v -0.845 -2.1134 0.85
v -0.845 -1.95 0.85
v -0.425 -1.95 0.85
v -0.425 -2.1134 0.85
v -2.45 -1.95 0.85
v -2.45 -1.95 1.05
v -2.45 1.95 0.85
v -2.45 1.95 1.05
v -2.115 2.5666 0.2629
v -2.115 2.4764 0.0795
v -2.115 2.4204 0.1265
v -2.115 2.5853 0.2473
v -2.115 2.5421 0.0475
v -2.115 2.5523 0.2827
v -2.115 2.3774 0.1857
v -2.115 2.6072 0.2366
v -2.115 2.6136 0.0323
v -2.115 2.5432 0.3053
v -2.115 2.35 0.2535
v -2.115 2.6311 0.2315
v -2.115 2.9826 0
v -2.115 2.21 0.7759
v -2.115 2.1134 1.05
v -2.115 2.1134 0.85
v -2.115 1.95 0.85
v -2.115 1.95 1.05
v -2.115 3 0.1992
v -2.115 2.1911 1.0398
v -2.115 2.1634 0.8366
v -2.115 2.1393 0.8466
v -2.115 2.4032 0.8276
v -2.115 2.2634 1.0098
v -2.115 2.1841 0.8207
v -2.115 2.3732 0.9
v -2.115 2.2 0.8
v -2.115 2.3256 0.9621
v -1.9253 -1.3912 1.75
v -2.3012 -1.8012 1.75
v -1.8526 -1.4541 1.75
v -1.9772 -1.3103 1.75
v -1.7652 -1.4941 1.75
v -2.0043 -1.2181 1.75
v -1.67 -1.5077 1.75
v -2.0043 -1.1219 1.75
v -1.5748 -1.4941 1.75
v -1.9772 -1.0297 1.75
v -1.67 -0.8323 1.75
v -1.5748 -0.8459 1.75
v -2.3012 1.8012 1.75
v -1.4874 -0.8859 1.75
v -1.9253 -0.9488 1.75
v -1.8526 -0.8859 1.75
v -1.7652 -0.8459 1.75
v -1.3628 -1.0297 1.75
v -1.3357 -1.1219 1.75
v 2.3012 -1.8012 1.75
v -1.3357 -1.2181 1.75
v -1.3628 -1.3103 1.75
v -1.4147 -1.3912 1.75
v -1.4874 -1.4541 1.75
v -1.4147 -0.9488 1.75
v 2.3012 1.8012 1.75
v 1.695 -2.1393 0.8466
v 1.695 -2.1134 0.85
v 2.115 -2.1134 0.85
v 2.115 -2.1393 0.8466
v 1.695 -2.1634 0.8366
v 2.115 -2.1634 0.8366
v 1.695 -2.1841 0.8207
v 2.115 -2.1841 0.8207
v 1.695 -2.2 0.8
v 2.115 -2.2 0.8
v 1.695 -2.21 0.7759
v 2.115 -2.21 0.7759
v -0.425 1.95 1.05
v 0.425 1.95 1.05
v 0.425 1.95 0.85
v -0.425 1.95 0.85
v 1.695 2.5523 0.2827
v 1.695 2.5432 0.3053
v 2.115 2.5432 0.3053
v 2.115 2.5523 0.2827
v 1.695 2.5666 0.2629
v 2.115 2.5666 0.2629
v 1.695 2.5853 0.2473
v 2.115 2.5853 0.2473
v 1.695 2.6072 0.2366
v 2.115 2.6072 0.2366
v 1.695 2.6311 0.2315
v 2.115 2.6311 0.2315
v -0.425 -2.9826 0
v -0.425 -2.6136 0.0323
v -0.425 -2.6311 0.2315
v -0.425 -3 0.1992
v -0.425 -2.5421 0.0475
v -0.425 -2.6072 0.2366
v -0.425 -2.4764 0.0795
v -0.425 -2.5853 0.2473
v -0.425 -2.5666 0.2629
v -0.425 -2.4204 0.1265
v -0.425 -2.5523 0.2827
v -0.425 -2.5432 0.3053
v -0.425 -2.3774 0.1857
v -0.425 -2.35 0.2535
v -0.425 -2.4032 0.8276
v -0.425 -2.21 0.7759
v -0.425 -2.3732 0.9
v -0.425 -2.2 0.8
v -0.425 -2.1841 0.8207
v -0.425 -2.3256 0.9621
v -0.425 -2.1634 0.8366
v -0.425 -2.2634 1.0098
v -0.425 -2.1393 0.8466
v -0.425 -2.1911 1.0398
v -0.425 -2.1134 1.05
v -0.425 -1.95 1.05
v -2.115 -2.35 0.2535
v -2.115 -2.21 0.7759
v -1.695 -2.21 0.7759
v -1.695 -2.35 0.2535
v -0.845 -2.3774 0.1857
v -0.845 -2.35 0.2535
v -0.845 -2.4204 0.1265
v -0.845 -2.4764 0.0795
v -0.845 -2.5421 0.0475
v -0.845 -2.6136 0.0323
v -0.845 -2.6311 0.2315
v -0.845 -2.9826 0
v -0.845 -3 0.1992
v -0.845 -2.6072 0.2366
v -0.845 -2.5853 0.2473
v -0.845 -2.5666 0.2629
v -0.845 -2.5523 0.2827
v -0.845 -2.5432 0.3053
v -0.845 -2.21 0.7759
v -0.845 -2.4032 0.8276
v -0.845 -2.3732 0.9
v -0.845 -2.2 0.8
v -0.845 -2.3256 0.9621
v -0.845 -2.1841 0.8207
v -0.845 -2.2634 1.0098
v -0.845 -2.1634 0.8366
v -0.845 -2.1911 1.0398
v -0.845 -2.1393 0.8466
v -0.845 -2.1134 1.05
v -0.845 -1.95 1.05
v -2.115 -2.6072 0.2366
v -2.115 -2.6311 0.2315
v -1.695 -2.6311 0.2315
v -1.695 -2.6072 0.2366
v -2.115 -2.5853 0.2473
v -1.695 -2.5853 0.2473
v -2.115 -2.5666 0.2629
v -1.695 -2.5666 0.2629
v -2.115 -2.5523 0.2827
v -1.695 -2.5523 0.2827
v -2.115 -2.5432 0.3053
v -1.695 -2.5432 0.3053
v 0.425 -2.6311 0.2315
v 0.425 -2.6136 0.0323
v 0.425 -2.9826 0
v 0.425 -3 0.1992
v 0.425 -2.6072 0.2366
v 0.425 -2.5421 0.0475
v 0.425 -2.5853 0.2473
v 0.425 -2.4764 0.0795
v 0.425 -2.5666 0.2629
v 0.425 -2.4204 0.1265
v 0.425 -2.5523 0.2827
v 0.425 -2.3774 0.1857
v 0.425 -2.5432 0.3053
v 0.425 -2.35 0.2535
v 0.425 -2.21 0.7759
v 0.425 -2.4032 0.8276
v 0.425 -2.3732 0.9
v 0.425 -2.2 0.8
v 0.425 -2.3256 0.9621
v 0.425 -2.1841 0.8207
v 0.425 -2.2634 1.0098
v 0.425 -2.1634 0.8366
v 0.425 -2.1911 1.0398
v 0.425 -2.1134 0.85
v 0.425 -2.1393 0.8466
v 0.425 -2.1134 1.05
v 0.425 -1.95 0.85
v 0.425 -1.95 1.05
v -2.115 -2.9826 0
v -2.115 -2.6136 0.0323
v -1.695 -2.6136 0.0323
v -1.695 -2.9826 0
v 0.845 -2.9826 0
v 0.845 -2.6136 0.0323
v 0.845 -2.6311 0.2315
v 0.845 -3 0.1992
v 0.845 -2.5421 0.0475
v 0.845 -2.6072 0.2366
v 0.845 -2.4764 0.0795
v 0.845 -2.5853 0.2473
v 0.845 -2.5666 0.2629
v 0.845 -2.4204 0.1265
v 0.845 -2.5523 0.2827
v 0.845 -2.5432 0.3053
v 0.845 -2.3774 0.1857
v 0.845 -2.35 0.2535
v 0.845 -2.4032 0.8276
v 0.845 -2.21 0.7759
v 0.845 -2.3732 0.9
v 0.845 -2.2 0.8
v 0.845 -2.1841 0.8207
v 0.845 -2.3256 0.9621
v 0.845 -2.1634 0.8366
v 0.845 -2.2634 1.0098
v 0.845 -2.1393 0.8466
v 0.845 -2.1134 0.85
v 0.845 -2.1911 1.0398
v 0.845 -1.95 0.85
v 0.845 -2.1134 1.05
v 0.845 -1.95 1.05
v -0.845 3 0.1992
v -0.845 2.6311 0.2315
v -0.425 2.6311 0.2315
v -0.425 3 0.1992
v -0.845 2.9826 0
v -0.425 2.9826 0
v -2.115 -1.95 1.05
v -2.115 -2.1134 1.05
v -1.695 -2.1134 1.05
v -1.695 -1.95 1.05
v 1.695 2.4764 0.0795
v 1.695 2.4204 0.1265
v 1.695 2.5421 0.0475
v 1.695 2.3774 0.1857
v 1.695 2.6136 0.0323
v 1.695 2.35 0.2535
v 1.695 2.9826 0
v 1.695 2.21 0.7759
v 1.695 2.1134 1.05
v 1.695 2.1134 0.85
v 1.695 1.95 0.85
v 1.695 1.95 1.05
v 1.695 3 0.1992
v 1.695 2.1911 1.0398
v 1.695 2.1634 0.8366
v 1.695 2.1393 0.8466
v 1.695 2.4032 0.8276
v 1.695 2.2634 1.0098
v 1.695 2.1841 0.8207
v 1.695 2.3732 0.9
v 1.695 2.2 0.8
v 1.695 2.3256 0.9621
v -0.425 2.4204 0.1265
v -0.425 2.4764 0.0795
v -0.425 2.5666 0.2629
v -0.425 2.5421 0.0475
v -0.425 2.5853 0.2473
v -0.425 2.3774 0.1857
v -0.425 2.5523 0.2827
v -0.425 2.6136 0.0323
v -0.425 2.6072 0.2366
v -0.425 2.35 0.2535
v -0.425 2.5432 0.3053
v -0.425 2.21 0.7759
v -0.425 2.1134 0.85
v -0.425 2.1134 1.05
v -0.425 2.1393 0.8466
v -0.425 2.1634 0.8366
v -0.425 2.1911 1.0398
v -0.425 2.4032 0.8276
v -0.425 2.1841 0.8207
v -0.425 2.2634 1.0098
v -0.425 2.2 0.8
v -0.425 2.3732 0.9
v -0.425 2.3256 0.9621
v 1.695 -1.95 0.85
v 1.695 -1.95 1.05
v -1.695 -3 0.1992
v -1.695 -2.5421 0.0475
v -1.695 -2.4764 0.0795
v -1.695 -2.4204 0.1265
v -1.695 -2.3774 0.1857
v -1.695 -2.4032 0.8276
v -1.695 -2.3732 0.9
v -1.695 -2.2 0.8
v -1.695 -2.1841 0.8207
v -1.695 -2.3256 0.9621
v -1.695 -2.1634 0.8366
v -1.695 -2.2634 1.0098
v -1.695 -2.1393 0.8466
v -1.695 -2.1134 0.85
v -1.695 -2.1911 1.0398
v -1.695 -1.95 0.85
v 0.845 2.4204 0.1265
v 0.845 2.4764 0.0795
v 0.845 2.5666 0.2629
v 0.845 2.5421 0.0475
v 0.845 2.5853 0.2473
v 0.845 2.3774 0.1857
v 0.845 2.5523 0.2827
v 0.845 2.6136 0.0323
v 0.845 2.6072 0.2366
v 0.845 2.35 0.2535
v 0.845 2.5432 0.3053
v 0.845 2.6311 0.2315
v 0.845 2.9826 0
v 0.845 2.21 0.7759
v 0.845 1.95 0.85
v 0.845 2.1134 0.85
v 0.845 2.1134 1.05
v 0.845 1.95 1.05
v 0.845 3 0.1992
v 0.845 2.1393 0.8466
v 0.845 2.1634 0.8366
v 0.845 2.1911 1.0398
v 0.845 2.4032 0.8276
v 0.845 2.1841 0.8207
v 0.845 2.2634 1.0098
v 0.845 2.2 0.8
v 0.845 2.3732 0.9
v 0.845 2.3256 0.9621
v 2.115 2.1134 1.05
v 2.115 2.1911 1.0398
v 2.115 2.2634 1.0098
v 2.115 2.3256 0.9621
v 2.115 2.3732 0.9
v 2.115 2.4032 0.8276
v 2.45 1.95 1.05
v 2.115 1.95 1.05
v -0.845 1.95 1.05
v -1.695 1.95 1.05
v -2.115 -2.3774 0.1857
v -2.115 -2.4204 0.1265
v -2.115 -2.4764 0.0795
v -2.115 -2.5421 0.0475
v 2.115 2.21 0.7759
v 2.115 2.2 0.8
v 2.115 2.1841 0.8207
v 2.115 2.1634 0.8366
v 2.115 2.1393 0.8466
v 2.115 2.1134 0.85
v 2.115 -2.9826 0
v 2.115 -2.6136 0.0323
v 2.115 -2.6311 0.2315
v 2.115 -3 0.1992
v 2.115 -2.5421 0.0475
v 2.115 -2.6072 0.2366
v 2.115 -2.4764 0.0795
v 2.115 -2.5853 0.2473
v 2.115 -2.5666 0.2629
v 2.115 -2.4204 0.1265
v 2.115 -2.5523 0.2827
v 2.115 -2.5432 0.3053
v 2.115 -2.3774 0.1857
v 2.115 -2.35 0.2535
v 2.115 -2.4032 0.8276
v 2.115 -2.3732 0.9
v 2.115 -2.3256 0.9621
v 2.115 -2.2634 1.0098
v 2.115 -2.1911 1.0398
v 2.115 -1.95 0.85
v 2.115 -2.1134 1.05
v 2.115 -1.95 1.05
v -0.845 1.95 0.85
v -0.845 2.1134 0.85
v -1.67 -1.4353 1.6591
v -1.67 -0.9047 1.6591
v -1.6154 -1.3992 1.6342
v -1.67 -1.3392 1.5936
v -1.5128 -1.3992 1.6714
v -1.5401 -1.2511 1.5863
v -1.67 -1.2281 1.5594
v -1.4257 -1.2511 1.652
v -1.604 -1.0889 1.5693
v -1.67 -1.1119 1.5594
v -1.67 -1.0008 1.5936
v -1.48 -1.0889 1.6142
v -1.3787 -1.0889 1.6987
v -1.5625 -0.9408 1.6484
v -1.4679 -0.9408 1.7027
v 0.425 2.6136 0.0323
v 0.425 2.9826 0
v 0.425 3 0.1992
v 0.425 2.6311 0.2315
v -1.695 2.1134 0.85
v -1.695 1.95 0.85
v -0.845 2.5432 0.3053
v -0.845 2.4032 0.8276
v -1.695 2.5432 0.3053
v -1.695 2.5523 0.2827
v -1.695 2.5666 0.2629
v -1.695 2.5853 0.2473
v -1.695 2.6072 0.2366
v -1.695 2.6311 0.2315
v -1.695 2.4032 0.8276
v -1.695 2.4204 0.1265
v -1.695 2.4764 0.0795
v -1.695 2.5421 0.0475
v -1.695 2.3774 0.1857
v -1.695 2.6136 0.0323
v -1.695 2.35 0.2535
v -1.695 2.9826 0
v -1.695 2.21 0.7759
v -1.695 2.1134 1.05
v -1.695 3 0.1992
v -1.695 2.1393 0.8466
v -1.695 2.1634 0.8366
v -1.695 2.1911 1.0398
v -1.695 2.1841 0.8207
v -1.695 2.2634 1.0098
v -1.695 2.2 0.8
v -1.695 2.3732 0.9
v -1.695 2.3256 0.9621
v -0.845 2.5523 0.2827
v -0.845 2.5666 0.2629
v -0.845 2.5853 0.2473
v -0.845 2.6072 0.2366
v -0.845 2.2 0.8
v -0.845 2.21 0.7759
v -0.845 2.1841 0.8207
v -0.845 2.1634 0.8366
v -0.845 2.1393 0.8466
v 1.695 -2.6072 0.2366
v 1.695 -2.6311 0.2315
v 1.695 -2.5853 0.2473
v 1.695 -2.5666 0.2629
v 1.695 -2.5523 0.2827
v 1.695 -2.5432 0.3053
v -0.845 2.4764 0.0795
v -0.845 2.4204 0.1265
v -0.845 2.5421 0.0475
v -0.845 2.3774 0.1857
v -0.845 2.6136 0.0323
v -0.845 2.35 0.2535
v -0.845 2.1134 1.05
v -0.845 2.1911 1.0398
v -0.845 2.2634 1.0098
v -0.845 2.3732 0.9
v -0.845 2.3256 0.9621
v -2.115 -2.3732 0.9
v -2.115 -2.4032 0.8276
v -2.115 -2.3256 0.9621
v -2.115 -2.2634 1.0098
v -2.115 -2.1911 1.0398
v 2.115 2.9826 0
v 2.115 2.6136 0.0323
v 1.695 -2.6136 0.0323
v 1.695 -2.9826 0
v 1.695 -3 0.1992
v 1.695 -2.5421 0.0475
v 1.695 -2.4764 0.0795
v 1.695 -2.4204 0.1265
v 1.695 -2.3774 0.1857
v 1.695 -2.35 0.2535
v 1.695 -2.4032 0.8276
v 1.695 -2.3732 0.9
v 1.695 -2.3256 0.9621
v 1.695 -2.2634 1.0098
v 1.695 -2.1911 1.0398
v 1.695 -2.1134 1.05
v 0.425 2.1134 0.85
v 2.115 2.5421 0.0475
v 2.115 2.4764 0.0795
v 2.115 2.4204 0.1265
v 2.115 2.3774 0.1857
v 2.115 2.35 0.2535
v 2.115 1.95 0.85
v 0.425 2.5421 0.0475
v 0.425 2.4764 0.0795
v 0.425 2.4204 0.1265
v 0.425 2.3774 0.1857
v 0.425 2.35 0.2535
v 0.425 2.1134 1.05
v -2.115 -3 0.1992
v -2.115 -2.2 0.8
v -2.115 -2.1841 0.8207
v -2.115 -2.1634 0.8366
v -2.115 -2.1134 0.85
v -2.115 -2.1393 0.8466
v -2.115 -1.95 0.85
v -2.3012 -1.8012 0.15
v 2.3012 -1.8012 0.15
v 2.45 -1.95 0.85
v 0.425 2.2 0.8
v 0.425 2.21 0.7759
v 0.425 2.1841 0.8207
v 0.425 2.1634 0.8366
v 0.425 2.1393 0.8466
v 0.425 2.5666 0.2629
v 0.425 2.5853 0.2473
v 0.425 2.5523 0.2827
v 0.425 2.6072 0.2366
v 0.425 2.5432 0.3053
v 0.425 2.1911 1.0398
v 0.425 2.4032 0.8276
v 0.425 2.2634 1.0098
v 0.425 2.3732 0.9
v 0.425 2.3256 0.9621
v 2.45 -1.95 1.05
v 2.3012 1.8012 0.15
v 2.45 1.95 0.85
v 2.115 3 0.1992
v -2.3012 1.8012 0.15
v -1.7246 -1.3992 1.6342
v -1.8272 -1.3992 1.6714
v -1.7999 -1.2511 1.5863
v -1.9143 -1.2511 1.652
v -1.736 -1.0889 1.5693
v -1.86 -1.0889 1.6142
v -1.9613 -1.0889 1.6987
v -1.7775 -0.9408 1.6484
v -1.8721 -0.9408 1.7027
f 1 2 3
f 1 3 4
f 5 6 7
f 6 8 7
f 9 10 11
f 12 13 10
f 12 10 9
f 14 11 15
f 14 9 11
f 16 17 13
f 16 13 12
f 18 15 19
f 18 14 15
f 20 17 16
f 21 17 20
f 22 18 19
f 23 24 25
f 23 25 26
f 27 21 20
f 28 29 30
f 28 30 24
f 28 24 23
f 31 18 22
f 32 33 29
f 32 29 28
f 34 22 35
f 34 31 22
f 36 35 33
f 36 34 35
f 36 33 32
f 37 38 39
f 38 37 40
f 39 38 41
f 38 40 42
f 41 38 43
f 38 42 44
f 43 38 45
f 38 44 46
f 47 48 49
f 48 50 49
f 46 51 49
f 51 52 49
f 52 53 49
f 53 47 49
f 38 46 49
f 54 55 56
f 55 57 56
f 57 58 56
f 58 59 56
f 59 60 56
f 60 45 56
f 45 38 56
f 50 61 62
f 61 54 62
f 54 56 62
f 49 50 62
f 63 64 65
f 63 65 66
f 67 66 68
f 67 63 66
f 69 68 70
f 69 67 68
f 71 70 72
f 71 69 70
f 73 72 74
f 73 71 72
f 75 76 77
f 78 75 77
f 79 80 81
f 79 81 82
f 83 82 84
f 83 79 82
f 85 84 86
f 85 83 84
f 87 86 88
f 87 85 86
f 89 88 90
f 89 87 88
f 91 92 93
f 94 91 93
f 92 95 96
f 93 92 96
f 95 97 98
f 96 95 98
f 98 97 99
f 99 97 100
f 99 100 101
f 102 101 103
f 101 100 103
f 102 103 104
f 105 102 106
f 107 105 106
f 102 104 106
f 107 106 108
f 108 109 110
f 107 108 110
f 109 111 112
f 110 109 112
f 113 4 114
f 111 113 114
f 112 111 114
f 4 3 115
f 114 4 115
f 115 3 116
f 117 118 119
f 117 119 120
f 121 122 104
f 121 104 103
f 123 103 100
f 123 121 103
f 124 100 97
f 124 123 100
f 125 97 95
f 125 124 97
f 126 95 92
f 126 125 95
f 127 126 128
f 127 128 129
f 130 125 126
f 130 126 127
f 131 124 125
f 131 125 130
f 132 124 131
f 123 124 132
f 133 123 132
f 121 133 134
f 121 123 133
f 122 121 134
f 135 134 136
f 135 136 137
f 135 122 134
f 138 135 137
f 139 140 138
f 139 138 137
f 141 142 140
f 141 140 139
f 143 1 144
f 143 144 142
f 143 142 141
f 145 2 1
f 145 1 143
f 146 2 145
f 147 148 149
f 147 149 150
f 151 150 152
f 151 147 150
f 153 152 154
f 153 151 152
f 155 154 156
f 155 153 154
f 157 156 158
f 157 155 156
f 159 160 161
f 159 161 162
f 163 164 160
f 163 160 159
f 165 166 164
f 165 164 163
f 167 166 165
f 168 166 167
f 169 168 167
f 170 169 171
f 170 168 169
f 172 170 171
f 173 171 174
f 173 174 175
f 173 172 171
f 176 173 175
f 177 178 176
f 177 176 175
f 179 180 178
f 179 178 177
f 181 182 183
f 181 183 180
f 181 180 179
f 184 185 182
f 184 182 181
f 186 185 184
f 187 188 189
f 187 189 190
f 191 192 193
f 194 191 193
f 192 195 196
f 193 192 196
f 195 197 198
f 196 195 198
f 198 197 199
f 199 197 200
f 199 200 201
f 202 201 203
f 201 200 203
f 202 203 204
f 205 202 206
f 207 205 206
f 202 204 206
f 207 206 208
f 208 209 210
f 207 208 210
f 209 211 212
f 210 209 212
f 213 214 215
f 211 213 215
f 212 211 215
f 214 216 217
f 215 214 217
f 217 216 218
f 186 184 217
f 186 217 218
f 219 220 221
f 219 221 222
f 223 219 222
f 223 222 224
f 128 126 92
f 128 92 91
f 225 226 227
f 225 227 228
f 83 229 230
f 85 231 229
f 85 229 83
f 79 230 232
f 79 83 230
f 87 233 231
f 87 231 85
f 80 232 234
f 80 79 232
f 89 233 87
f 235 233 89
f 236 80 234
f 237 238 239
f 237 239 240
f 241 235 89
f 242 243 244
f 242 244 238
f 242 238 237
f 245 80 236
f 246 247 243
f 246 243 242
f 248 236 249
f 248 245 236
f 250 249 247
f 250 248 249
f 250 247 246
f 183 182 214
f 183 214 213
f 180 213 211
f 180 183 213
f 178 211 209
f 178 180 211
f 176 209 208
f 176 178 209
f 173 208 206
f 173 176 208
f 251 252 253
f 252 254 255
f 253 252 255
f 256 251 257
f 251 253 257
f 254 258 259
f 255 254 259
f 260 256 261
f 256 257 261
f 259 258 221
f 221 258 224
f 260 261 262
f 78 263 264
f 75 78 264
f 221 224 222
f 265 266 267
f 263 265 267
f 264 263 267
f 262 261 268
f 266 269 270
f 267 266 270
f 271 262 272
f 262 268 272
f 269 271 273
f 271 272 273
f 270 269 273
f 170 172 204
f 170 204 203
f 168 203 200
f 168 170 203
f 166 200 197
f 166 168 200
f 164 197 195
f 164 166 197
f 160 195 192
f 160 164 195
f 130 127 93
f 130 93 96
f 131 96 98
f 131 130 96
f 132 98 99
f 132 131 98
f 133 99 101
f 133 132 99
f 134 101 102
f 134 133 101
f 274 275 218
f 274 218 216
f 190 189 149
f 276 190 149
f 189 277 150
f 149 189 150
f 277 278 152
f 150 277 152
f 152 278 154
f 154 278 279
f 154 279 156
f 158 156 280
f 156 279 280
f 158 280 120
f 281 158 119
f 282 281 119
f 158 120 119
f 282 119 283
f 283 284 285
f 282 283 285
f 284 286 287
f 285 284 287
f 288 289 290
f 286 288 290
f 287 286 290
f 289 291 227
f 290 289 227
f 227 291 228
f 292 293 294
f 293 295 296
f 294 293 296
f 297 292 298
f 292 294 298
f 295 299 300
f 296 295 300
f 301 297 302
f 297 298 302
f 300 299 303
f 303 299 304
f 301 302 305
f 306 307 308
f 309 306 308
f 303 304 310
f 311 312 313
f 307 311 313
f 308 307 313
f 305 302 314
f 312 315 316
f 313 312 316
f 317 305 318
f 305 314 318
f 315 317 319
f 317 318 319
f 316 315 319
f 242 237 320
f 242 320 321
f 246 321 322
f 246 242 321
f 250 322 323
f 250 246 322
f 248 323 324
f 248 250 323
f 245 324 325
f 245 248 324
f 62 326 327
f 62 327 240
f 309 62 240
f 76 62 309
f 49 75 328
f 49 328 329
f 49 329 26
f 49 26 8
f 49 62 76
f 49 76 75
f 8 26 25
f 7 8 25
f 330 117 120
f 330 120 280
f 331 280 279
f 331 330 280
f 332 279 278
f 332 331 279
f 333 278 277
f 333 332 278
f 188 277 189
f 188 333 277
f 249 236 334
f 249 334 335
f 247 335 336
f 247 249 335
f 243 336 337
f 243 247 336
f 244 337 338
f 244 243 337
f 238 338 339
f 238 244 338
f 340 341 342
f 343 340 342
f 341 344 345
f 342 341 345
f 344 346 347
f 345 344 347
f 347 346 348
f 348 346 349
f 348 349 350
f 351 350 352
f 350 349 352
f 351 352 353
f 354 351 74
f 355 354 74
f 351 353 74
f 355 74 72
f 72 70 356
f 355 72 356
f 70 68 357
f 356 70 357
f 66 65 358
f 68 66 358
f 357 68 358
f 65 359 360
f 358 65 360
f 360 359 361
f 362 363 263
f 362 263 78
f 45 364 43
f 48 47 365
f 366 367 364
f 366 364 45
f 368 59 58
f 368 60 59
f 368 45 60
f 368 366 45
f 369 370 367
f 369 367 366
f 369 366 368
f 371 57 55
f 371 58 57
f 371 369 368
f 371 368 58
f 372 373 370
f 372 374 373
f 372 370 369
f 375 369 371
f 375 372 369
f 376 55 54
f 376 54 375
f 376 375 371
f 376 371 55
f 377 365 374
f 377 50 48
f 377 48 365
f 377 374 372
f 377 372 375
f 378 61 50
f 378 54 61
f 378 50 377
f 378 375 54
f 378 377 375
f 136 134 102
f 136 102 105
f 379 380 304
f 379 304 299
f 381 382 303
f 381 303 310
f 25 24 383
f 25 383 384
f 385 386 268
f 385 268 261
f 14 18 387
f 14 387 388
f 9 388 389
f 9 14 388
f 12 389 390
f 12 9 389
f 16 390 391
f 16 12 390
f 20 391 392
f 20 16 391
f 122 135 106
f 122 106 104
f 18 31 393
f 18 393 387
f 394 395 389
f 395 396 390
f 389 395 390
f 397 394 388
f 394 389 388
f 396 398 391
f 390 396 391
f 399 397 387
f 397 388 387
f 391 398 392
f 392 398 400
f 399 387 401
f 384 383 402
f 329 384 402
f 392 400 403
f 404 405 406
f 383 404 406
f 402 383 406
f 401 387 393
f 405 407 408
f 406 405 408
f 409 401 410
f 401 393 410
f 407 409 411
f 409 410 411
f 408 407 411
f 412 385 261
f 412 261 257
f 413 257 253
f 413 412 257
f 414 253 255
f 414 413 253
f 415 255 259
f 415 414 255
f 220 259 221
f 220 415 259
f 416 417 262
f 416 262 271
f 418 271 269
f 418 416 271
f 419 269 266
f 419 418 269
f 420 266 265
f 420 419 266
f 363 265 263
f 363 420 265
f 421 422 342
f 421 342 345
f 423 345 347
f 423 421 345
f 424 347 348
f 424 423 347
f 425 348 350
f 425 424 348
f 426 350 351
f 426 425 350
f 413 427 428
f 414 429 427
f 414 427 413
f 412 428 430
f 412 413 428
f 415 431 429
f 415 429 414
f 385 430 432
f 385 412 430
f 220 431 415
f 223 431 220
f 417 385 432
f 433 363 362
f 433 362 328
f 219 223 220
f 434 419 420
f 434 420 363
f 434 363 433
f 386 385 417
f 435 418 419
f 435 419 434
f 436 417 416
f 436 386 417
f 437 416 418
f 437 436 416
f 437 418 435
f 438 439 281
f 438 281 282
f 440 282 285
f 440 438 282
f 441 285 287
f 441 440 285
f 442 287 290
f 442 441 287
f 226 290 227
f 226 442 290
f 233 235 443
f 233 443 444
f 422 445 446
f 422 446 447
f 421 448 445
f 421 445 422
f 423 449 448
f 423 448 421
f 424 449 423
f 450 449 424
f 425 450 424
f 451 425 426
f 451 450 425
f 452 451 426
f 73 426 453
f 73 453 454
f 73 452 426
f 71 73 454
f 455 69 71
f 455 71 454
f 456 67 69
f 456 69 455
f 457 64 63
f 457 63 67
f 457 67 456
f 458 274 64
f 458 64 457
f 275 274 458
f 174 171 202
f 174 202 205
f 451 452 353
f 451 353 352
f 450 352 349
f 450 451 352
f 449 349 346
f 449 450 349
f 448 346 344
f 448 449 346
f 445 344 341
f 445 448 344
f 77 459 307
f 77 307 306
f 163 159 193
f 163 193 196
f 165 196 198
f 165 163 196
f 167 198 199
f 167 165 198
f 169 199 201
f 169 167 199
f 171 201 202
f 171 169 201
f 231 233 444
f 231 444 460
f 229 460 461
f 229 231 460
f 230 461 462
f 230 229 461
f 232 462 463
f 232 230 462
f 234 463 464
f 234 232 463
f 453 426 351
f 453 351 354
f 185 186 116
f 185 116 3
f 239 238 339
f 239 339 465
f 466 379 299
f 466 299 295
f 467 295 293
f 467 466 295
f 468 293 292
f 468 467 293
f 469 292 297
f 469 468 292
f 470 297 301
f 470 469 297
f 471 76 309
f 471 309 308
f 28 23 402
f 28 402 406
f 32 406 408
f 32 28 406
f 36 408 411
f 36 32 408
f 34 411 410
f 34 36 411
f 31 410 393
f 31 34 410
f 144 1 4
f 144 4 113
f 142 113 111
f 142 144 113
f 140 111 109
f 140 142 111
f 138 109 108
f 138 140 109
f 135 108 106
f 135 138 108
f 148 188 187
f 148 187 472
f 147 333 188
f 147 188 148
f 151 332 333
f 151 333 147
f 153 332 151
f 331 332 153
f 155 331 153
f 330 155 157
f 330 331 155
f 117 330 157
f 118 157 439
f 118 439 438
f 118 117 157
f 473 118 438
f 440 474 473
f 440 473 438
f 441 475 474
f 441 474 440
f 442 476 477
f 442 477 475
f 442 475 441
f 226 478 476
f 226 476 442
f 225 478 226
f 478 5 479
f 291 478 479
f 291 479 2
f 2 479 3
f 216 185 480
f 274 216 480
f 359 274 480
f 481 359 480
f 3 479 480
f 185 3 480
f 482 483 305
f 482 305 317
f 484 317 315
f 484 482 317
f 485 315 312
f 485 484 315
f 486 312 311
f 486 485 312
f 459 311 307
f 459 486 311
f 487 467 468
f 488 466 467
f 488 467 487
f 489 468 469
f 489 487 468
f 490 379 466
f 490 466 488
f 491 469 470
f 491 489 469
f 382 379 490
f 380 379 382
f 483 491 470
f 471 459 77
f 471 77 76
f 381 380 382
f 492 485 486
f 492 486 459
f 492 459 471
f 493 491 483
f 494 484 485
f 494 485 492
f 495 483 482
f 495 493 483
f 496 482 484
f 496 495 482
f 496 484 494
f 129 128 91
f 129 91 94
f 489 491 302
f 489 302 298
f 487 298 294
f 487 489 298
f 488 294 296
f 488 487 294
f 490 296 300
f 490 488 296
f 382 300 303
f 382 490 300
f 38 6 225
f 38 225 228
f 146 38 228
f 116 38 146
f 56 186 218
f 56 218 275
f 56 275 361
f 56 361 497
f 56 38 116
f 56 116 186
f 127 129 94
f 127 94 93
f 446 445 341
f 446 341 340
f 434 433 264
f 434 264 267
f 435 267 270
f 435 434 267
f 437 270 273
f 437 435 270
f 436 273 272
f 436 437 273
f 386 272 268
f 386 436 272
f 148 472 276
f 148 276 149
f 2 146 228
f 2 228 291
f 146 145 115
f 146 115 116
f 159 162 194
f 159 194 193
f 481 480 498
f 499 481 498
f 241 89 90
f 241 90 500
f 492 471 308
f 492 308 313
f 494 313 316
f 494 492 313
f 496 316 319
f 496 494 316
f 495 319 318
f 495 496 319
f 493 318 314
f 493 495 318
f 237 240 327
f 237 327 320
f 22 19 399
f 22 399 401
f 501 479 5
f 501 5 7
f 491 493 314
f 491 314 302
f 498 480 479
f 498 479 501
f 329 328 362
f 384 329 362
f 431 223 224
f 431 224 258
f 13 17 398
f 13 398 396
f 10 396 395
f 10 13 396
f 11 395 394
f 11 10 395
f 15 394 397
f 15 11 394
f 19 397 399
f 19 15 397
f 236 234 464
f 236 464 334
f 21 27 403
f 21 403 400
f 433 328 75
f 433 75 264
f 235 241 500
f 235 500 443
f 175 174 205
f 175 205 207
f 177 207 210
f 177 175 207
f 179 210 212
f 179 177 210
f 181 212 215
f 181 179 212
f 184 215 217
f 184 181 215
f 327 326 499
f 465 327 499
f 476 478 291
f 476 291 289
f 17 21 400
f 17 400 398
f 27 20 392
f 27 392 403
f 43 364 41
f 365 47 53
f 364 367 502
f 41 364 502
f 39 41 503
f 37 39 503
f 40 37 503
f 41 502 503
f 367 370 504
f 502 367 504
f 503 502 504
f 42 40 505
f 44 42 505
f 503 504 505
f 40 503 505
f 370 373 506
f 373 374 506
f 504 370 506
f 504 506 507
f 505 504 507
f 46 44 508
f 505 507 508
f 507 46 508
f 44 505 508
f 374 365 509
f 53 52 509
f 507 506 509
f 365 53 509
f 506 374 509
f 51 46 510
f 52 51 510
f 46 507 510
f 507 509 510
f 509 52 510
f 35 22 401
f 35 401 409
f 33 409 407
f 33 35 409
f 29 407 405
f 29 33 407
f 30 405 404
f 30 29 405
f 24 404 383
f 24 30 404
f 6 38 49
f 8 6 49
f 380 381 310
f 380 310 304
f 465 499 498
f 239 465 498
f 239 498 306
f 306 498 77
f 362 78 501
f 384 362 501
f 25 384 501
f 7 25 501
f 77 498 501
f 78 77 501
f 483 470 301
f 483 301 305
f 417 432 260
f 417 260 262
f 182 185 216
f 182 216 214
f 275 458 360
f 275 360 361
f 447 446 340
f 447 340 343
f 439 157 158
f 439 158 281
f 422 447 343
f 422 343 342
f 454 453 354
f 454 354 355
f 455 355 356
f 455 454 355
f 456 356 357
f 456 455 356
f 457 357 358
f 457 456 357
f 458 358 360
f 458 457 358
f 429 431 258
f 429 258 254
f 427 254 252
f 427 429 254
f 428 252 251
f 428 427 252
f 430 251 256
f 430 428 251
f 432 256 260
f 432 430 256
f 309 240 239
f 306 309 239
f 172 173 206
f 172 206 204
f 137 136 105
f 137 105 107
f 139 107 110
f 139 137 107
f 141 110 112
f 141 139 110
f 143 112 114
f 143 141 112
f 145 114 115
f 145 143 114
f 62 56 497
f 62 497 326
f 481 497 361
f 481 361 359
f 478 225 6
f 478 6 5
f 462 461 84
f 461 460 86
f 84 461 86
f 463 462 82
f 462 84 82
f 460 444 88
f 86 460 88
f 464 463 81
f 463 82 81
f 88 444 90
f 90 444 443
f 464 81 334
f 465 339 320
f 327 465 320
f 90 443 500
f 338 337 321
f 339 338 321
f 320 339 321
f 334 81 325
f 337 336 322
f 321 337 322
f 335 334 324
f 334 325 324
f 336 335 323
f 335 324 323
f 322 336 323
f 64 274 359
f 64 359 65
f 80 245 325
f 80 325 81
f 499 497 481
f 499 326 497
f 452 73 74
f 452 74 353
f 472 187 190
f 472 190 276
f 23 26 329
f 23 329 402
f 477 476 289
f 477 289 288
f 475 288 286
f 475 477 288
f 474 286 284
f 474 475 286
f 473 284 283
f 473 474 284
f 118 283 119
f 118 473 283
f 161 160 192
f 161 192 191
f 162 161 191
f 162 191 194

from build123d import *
from OCP.BRepFilletAPI import BRepFilletAPI_MakeChamfer
from build123d.topology import SkipClean

# Parameters (mm, degrees)
BODYWXH_W          = 1.6
BODYWXH_H          = 3.9
BOSS_BODY_DEPTH    = 2.45
CHAMFER1_SIZE      = 0.7
CHAMFER1_SIZE2     = 0.148789593
PINS_DEPTH         = 0.42
PATTERNLEADS_COUNT = 4
PATTERNLEADS_PITCH = 1.27


with BuildPart() as part:
    # BodyWxH → Boss-Body (new, symmetric)
    with BuildSketch(Plane(origin=(0, 0, 0), x_dir=(0, 0, -1), z_dir=(1, 0, 0))):
        with Locations((-0.95, 0)):
            Rectangle(BODYWXH_W, BODYWXH_H)
    extrude(amount=BOSS_BODY_DEPTH, both=True)

    # Chamfer1: one chamfer whose edges measure the first distance from different faces: ONE call of the kernel's chamfer builder (chamfer() names one face for all edges)
    chamfer1_edges_1 = [part.edges().sort_by_distance(p)[0] for p in [
        (0, -1.95, 0.15),
        (0, -1.95, 1.75),
    ]]
    chamfer1_side_1 = [part.faces().sort_by_distance(p)[0] for p in [
        (0, -1.95, 0.95),
    ]]
    chamfer1_edges_2 = [part.edges().sort_by_distance(p)[0] for p in [
        (2.45, 0, 0.15),
        (2.45, 0, 1.75),
    ]]
    chamfer1_side_2 = [part.faces().sort_by_distance(p)[0] for p in [
        (2.45, 0, 0.95),
    ]]
    chamfer1_edges_3 = [part.edges().sort_by_distance(p)[0] for p in [
        (0, 1.95, 0.15),
        (0, 1.95, 1.75),
    ]]
    chamfer1_side_3 = [part.faces().sort_by_distance(p)[0] for p in [
        (0, 1.95, 0.95),
    ]]
    chamfer1_edges_4 = [part.edges().sort_by_distance(p)[0] for p in [
        (-2.45, 0, 0.15),
        (-2.45, 0, 1.75),
    ]]
    chamfer1_side_4 = [part.faces().sort_by_distance(p)[0] for p in [
        (-2.45, 0, 0.95),
    ]]
    chamfer1 = BRepFilletAPI_MakeChamfer(part.part.solid().wrapped)
    for e in chamfer1_edges_1:
        chamfer1.Add(CHAMFER1_SIZE, CHAMFER1_SIZE2, e.wrapped, chamfer1_side_1[0].wrapped)  # the first distance lies on this face
    for e in chamfer1_edges_2:
        chamfer1.Add(CHAMFER1_SIZE, CHAMFER1_SIZE2, e.wrapped, chamfer1_side_2[0].wrapped)  # the first distance lies on this face
    for e in chamfer1_edges_3:
        chamfer1.Add(CHAMFER1_SIZE, CHAMFER1_SIZE2, e.wrapped, chamfer1_side_3[0].wrapped)  # the first distance lies on this face
    for e in chamfer1_edges_4:
        chamfer1.Add(CHAMFER1_SIZE, CHAMFER1_SIZE2, e.wrapped, chamfer1_side_4[0].wrapped)  # the first distance lies on this face
    add(Compound.cast(chamfer1.Shape()), mode=Mode.REPLACE)

    # LeadCross → Pins (add)
    with BuildSketch(Plane(origin=(-2.115, 0, 0), x_dir=(0, 0, -1), z_dir=(1, 0, 0))):
        with BuildLine():
            Line((0, -2.982568851), (-0.19923894, -3))
            Line((-0.19923894, -3), (-0.231516817, -2.631062174))
            ThreePointArc((-0.231516817, -2.631062174), (-0.254531842, -2.575498987), (-0.305254382, -2.543185165))
            Line((-0.305254382, -2.543185165), (-0.827645714, -2.40321083))
            ThreePointArc((-0.827645714, -2.40321083), (-0.988006002, -2.296061511), (-1.05, -2.113433082))
            Line((-1.05, -2.113433082), (-1.05, 2.113433082))
            ThreePointArc((-1.05, 2.113433082), (-0.988006002, 2.296061511), (-0.827645714, 2.40321083))
            Line((-0.827645714, 2.40321083), (-0.305254382, 2.543185165))
            ThreePointArc((-0.305254382, 2.543185165), (-0.254531842, 2.575498987), (-0.231516817, 2.631062174))
            Line((-0.231516817, 2.631062174), (-0.19923894, 3))
            Line((-0.19923894, 3), (0, 2.982568851))
            Line((0, 2.982568851), (-0.032277877, 2.613631025))
            ThreePointArc((-0.032277877, 2.613631025), (-0.101322954, 2.446941465), (-0.253490573, 2.35))
            Line((-0.253490573, 2.35), (-0.775881905, 2.210025665))
            ThreePointArc((-0.775881905, 2.210025665), (-0.829335334, 2.174309225), (-0.85, 2.113433082))
            Line((-0.85, 2.113433082), (-0.85, -2.113433082))
            ThreePointArc((-0.85, -2.113433082), (-0.829335334, -2.174309225), (-0.775881905, -2.210025665))
            Line((-0.775881905, -2.210025665), (-0.253490573, -2.35))
            ThreePointArc((-0.253490573, -2.35), (-0.101322954, -2.446941465), (-0.032277877, -2.613631025))
            Line((-0.032277877, -2.613631025), (0, -2.982568851))
        make_face()
    pins = extrude(amount=PINS_DEPTH)

    # PatternLeads: Pins ×4
    with Locations(*[(i * PATTERNLEADS_PITCH, 0, 0) for i in range(1, PATTERNLEADS_COUNT)]):
        add(pins)

    # Pin1Indent → Cut-Pin1Indent (revolve, cut)
    with SkipClean():  # the faces are left unmerged after this step: merging them gives an invalid solid
        with BuildSketch(Plane(origin=(-1.67, 0, 0), x_dir=(0, 0, -1), z_dir=(1, 0, 0))):
            with BuildLine():
                Line((-1.945, -0.78), (-1.945, -1.56))
                ThreePointArc((-1.945, -1.56), (-1.555, -1.17), (-1.945, -0.78))
            make_face()
        revolve(axis=Axis((-1.67, -0.78, 1.945), (0, -1, 0)), mode=Mode.SUBTRACT)


solid = part.part
